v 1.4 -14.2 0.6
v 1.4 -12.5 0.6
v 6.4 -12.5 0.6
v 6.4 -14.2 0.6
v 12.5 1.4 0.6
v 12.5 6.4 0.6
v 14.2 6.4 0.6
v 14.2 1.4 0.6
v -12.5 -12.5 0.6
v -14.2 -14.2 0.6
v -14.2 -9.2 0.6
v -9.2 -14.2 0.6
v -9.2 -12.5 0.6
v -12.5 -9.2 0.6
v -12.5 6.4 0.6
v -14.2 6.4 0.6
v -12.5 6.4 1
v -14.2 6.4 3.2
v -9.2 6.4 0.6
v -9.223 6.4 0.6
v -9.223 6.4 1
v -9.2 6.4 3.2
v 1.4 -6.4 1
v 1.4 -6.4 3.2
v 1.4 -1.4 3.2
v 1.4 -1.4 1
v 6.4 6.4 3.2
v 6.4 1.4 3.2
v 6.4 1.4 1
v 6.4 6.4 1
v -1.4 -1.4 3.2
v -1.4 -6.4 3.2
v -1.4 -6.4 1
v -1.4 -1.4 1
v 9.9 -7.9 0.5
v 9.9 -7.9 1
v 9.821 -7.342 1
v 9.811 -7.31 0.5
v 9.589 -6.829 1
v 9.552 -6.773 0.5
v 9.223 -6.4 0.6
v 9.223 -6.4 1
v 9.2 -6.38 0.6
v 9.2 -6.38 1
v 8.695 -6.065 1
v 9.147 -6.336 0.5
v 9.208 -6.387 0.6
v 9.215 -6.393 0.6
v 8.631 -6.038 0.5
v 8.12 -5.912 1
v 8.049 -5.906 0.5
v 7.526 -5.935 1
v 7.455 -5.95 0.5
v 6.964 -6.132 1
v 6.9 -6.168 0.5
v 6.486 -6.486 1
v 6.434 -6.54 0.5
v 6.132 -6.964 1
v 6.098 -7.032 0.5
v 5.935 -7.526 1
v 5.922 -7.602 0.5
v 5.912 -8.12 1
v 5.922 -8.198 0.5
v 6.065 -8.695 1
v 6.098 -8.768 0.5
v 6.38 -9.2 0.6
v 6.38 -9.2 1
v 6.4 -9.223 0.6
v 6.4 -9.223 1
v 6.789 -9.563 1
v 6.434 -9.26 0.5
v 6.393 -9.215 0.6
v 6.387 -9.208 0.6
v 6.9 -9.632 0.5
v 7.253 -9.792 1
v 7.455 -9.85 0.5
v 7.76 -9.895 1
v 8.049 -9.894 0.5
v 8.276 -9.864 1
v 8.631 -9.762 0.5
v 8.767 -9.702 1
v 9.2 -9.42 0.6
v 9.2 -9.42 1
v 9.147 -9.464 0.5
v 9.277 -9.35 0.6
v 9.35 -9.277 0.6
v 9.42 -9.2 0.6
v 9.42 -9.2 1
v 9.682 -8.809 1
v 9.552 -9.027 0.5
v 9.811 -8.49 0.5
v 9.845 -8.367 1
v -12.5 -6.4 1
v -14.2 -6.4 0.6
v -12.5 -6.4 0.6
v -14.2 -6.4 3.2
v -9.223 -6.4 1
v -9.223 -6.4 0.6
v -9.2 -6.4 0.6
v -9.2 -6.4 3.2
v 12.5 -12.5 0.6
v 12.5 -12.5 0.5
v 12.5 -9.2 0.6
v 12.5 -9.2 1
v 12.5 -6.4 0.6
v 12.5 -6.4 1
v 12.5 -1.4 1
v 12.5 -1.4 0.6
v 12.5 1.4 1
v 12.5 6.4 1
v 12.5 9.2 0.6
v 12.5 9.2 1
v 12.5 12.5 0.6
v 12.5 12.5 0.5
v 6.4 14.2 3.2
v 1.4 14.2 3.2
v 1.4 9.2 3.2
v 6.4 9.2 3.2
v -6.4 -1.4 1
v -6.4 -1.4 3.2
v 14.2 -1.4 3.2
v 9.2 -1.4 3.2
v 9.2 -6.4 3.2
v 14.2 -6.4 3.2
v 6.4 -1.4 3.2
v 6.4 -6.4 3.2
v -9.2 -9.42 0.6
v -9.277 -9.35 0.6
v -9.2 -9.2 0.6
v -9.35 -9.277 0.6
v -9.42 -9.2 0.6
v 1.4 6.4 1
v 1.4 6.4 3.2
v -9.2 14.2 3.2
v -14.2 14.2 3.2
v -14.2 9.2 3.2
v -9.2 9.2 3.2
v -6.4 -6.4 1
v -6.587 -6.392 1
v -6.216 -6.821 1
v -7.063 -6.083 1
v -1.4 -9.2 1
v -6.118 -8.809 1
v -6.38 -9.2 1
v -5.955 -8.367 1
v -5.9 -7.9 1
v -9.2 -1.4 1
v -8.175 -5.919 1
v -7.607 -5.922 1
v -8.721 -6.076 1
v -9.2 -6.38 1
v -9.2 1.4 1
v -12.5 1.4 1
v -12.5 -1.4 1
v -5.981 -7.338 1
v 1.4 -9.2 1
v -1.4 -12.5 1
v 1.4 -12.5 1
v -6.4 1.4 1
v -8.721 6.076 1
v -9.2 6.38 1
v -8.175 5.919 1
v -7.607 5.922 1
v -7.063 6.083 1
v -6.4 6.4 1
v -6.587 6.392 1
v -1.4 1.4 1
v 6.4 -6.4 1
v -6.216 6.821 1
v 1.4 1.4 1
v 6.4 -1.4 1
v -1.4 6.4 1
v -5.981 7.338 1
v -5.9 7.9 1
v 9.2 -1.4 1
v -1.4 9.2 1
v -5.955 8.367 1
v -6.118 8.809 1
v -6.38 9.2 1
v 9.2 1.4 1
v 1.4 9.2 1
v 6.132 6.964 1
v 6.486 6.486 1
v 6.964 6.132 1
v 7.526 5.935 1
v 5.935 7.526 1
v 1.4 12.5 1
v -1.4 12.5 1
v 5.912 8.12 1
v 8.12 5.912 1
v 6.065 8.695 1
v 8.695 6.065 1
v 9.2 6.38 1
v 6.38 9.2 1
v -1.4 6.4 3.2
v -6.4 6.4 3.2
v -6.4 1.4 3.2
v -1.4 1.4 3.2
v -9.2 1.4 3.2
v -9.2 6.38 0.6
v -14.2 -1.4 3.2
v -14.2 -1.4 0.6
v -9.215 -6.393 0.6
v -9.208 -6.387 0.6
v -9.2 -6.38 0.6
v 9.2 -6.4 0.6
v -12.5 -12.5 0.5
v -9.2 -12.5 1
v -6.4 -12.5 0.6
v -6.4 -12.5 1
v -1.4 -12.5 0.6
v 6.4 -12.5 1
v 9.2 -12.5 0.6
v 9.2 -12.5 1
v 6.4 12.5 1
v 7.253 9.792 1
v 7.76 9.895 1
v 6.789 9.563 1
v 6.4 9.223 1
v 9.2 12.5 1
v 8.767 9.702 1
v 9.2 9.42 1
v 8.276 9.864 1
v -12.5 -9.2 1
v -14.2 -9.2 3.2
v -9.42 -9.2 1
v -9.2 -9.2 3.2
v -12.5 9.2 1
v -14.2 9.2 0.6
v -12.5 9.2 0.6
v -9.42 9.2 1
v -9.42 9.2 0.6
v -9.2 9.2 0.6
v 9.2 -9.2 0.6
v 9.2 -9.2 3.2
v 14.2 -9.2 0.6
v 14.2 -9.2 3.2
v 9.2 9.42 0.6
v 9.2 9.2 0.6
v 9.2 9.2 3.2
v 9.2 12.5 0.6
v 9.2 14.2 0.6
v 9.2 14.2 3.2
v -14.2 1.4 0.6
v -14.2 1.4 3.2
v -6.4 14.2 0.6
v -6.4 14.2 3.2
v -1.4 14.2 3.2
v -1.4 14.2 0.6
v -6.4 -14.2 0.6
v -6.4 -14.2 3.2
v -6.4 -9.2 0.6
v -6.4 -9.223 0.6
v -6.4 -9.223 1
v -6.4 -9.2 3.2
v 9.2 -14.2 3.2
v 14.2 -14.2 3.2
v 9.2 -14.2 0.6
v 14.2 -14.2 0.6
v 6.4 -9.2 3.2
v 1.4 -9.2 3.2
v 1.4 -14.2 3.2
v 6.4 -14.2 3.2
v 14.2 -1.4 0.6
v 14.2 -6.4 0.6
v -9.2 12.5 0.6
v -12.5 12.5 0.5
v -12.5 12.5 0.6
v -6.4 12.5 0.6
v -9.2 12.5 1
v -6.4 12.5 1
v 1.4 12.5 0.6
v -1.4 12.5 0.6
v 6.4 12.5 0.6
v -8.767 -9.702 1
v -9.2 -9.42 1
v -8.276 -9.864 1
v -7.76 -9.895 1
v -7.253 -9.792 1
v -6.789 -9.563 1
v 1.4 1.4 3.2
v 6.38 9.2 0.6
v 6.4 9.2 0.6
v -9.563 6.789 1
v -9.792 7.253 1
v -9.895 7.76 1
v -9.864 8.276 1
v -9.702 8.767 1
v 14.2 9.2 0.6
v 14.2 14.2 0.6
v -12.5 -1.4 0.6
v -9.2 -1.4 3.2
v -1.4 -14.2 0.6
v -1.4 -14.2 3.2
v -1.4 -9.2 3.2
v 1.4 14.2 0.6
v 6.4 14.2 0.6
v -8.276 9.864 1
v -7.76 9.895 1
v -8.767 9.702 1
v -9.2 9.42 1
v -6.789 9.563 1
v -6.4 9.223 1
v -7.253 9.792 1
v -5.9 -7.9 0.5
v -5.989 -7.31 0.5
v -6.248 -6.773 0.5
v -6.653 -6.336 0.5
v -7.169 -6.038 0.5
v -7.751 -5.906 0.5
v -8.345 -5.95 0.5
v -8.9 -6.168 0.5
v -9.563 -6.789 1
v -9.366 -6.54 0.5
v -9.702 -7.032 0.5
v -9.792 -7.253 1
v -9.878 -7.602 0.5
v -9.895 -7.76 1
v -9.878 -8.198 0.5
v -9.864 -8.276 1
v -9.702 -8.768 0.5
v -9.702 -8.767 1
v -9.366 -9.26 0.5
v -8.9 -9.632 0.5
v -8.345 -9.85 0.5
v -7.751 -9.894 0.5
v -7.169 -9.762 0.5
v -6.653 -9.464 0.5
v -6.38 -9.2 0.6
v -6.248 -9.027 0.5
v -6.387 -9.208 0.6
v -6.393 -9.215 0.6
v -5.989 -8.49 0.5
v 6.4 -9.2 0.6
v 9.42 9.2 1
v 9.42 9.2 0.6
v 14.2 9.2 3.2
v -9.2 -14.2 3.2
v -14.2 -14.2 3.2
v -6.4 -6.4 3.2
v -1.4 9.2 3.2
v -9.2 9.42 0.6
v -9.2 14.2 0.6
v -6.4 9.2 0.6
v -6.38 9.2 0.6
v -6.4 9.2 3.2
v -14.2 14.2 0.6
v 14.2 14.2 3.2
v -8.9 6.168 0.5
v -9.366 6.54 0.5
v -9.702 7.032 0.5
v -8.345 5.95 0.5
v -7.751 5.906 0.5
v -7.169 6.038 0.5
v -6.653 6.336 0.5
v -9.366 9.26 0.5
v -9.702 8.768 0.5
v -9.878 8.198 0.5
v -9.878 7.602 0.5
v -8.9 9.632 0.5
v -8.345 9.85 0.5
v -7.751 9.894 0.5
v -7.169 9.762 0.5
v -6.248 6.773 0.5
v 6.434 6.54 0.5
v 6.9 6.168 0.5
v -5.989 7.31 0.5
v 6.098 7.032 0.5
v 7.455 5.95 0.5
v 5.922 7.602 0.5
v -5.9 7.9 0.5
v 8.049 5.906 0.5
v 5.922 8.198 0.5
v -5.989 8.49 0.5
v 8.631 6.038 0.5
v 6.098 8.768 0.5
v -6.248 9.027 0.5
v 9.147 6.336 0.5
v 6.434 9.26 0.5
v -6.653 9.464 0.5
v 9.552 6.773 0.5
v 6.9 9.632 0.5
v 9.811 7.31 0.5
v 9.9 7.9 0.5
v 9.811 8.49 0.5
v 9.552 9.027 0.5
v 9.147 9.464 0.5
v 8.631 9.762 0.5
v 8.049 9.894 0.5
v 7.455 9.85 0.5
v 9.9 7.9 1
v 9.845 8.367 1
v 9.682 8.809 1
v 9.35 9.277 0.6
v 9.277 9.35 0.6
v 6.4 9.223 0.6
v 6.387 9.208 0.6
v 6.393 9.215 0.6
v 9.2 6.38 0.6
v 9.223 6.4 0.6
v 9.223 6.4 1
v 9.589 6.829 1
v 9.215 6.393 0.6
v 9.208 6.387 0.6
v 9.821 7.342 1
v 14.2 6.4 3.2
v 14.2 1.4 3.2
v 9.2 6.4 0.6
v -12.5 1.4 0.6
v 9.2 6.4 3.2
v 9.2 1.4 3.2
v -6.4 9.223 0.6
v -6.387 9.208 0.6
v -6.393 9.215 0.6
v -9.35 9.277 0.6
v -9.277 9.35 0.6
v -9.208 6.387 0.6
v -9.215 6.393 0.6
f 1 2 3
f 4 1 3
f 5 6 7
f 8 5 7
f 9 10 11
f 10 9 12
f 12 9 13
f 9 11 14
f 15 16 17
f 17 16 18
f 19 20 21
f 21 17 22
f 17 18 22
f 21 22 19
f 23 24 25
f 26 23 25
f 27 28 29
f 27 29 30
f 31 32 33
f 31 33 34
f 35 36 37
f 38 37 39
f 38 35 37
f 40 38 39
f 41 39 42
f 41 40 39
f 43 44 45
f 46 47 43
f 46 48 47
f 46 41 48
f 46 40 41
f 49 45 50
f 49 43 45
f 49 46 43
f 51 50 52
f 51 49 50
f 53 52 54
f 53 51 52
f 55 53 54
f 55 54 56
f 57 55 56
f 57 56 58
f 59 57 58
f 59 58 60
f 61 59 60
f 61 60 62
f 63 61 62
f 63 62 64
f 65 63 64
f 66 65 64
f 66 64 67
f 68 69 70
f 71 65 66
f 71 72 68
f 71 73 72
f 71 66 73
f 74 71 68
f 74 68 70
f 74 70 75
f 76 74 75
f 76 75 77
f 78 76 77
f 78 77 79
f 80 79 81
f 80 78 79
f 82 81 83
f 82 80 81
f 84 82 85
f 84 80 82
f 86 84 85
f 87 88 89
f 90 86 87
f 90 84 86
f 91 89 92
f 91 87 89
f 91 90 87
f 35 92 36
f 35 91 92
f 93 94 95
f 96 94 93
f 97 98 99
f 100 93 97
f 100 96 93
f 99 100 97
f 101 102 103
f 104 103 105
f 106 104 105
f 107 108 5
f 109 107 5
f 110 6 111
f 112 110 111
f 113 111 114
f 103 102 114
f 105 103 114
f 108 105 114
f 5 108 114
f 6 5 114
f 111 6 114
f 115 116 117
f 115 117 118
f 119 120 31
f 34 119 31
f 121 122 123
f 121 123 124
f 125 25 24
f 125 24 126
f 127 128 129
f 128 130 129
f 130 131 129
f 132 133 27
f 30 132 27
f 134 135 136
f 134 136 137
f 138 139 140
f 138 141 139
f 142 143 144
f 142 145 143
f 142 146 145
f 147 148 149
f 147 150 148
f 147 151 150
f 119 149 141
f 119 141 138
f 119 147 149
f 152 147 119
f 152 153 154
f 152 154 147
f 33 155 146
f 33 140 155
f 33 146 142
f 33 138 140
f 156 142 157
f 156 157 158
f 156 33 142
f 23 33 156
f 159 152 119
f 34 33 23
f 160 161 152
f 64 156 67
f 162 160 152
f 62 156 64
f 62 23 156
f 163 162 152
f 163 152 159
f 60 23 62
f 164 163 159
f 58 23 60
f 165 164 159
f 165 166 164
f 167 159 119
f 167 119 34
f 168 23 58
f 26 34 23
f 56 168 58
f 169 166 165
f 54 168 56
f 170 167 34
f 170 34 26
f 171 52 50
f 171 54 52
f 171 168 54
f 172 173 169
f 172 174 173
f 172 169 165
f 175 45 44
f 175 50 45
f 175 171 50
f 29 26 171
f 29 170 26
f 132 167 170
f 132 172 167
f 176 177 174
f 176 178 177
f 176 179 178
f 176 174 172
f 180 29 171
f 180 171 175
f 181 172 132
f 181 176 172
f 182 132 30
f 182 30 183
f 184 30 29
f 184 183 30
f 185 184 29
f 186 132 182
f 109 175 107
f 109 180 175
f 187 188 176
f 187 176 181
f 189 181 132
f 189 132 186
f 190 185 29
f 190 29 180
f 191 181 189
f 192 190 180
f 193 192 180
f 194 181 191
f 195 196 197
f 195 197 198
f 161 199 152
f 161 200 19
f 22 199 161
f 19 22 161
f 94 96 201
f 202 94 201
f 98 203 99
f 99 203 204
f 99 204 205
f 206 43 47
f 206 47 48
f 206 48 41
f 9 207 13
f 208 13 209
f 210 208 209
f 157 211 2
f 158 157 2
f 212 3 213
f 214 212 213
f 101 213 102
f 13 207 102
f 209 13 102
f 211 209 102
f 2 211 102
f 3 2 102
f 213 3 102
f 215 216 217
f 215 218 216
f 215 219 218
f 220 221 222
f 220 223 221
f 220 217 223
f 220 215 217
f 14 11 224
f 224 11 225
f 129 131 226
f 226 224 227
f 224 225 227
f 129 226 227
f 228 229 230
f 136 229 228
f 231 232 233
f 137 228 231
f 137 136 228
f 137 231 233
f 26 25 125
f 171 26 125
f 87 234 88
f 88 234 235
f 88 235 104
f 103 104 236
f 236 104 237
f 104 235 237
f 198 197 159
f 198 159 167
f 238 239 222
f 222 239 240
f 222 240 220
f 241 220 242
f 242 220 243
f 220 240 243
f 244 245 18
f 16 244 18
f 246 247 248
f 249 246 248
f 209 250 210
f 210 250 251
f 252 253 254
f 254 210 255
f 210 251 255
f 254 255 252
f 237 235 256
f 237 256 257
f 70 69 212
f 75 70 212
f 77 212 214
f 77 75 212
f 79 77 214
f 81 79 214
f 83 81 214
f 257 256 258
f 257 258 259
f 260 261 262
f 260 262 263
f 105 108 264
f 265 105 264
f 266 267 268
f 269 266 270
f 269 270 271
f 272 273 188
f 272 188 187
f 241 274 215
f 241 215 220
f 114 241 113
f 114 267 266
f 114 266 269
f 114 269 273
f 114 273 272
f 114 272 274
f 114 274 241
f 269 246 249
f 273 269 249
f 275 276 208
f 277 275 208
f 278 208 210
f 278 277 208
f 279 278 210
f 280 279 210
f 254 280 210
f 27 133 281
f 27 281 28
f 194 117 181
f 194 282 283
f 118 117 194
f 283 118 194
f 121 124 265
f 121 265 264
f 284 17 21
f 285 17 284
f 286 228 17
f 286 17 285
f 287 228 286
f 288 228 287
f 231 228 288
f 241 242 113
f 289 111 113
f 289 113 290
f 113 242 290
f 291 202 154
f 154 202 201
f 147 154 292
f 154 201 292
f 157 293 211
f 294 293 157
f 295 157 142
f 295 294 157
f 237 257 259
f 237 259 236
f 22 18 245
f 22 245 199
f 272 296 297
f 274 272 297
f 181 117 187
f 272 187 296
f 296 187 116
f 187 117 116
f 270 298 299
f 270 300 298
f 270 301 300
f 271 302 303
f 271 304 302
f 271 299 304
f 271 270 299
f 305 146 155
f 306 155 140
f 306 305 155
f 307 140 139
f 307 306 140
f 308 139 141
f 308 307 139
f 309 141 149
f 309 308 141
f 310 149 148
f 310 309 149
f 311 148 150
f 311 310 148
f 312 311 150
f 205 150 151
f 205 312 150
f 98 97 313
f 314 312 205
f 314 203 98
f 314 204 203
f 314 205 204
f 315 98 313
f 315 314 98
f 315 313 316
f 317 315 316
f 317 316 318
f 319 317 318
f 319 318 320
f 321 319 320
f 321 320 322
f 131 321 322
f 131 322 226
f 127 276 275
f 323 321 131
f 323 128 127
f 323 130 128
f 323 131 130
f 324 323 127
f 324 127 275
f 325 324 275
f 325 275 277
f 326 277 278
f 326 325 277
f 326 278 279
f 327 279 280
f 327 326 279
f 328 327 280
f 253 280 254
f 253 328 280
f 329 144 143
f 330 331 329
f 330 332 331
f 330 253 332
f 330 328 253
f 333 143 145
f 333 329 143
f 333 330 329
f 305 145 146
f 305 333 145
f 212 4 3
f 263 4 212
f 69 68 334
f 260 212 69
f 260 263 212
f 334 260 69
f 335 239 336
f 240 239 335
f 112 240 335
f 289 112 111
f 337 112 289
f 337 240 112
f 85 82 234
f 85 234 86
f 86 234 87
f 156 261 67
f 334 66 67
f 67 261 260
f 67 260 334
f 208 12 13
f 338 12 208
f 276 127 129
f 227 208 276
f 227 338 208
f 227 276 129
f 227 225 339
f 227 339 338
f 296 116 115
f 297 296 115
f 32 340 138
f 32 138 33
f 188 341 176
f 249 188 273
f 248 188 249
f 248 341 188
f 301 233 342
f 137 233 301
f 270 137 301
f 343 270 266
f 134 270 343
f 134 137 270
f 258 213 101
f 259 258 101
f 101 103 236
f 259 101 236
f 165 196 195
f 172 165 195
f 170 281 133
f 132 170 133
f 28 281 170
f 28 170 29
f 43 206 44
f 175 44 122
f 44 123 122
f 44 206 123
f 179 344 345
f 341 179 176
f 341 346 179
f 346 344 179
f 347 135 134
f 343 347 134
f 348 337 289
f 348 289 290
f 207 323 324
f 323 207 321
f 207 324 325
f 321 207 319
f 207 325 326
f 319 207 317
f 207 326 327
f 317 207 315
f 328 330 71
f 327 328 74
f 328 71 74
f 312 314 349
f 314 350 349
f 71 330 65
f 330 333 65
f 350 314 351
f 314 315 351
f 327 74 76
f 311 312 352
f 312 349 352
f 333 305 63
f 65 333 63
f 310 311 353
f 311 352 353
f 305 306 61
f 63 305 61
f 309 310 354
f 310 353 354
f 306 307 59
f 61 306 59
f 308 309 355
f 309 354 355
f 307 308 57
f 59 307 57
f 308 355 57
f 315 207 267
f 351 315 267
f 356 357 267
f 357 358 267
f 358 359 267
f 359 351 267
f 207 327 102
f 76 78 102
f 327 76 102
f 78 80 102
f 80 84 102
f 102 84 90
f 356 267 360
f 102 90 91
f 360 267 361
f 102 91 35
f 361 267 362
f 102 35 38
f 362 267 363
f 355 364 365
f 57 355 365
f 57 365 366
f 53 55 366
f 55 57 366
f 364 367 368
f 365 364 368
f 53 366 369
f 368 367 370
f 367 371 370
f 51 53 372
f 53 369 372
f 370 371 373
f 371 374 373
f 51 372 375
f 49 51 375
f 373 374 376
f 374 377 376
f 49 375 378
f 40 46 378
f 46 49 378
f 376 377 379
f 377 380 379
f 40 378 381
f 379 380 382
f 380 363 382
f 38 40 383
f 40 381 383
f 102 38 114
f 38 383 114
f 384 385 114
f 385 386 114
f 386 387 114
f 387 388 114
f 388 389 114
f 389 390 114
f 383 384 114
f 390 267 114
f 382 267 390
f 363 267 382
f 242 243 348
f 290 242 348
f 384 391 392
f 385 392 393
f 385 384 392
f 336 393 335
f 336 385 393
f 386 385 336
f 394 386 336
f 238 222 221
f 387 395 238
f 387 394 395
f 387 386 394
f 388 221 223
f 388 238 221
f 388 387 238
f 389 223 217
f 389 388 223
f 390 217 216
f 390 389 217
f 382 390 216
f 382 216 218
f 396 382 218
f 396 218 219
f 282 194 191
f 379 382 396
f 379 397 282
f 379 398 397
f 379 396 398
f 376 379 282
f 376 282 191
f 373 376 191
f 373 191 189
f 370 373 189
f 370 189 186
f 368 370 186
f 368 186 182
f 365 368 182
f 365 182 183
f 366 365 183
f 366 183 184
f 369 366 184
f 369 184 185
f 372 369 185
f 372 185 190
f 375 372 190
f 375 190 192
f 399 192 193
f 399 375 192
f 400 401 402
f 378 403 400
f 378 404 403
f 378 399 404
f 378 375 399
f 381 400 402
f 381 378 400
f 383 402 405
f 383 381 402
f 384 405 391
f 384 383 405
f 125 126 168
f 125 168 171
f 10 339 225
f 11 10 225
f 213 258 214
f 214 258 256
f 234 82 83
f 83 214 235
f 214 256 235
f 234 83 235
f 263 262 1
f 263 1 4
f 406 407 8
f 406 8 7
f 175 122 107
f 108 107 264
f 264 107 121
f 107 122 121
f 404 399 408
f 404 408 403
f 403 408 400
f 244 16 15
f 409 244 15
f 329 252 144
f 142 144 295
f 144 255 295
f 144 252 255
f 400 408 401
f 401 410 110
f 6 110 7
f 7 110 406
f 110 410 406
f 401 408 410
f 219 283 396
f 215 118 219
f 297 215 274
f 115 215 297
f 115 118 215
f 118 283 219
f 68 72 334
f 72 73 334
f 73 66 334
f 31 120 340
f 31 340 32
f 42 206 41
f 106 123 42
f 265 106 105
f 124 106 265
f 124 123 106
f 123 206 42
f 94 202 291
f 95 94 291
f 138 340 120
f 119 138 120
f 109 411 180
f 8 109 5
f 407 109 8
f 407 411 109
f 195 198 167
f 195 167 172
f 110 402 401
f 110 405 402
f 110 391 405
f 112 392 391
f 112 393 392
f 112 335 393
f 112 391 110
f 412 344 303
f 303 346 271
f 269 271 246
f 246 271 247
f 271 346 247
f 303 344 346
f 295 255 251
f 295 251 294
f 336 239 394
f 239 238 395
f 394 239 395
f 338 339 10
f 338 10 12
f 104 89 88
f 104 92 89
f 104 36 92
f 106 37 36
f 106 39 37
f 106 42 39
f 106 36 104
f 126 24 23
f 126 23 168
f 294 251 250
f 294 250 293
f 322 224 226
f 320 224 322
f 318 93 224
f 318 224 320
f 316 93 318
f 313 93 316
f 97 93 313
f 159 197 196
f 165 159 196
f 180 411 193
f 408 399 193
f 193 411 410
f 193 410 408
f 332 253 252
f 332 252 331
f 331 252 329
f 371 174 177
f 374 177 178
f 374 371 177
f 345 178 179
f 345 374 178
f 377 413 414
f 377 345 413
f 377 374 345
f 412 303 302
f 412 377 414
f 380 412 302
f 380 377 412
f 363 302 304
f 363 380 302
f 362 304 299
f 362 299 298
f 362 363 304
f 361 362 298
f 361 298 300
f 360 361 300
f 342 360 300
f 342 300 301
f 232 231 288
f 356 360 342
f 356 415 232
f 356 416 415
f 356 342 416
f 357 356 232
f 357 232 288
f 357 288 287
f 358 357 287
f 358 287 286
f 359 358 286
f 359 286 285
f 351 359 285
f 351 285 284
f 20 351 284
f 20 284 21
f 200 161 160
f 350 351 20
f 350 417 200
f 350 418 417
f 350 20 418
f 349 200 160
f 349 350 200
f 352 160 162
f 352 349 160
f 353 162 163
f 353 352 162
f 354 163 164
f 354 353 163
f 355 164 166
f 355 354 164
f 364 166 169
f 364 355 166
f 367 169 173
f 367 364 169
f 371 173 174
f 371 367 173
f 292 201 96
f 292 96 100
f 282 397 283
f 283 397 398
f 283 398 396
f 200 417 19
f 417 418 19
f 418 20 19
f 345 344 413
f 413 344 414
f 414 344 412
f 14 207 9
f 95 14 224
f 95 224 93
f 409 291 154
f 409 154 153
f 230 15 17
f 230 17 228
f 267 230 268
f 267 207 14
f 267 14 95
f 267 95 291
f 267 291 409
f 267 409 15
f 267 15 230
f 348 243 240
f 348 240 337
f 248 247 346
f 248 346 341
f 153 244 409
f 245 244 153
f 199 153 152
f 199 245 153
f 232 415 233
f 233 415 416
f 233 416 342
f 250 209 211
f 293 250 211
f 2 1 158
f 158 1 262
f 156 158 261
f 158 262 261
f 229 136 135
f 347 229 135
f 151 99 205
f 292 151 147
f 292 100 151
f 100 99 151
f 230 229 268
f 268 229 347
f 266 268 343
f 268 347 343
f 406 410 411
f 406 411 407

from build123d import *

# Parameters (mm, degrees)
SKETCH008_W                     = 25
SKETCH008_H                     = 25
SKETCH008_R                     = 2
PAD007_DEPTH                    = 0.5
SKETCH009_W                     = 5
SKETCH009_H                     = 5
PAD008_DEPTH                    = 2.6
SKETCH009_LINEARPATTERN008_2_W  = 5
SKETCH009_LINEARPATTERN008_2_H  = 5
PAD008_LINEARPATTERN008_2_DEPTH = 2.6
SKETCH009_LINEARPATTERN008_3_W  = 5
SKETCH009_LINEARPATTERN008_3_H  = 5
PAD008_LINEARPATTERN008_3_DEPTH = 2.6
SKETCH009_LINEARPATTERN008_4_W  = 5
SKETCH009_LINEARPATTERN008_4_H  = 5
PAD008_LINEARPATTERN008_4_DEPTH = 2.6
LINEARPATTERN007_COUNT          = 4
LINEARPATTERN007_PITCH          = 7.8


with BuildPart() as part:
    # Sketch008 → Pad007 (new body)
    with BuildSketch(Plane.XY.offset(0.5)):
        Rectangle(SKETCH008_W, SKETCH008_H)
        with Locations((-7.9, 7.9)):
            Circle(SKETCH008_R, mode=Mode.SUBTRACT)
        with Locations((7.9, 7.9)):
            Circle(SKETCH008_R, mode=Mode.SUBTRACT)
        with Locations((7.9, -7.9)):
            Circle(SKETCH008_R, mode=Mode.SUBTRACT)
        with Locations((-7.9, -7.9)):
            Circle(SKETCH008_R, mode=Mode.SUBTRACT)
    extrude(amount=PAD007_DEPTH)

    # Sketch009 → Pad008 (join)
    with BuildSketch(Plane.XY.offset(3.2)):
        with Locations((-11.7, -11.7)):
            Rectangle(SKETCH009_W, SKETCH009_H)
    pad008 = extrude(amount=-PAD008_DEPTH)

    # Sketch009 LinearPattern008 2 → Pad008 LinearPattern008 2 (add)
    with BuildSketch(Plane(origin=(7.8, 0, 3.2), x_dir=(1, 0, 0), z_dir=(0, 0, 1))):
        with Locations((-11.7, -11.7)):
            Rectangle(SKETCH009_LINEARPATTERN008_2_W, SKETCH009_LINEARPATTERN008_2_H)
    pad008_linearpattern008_2 = extrude(amount=-PAD008_LINEARPATTERN008_2_DEPTH)

    # Sketch009 LinearPattern008 3 → Pad008 LinearPattern008 3 (add)
    with BuildSketch(Plane(origin=(15.6, 0, 3.2), x_dir=(1, 0, 0), z_dir=(0, 0, 1))):
        with Locations((-11.7, -11.7)):
            Rectangle(SKETCH009_LINEARPATTERN008_3_W, SKETCH009_LINEARPATTERN008_3_H)
    pad008_linearpattern008_3 = extrude(amount=-PAD008_LINEARPATTERN008_3_DEPTH)

    # Sketch009 LinearPattern008 4 → Pad008 LinearPattern008 4 (add)
    with BuildSketch(Plane(origin=(23.4, 0, 3.2), x_dir=(1, 0, 0), z_dir=(0, 0, 1))):
        with Locations((-11.7, -11.7)):
            Rectangle(SKETCH009_LINEARPATTERN008_4_W, SKETCH009_LINEARPATTERN008_4_H)
    pad008_linearpattern008_4 = extrude(amount=-PAD008_LINEARPATTERN008_4_DEPTH)

    # LinearPattern007: Pad008, Pad008 LinearPattern008 2, Pad008 LinearPattern008 3, Pad008 LinearPattern008 4 ×4
    with Locations(*[(0, i * LINEARPATTERN007_PITCH, 0) for i in range(1, LINEARPATTERN007_COUNT)]):
        add(pad008)
        add(pad008_linearpattern008_2)
        add(pad008_linearpattern008_3)
        add(pad008_linearpattern008_4)


solid = part.part
